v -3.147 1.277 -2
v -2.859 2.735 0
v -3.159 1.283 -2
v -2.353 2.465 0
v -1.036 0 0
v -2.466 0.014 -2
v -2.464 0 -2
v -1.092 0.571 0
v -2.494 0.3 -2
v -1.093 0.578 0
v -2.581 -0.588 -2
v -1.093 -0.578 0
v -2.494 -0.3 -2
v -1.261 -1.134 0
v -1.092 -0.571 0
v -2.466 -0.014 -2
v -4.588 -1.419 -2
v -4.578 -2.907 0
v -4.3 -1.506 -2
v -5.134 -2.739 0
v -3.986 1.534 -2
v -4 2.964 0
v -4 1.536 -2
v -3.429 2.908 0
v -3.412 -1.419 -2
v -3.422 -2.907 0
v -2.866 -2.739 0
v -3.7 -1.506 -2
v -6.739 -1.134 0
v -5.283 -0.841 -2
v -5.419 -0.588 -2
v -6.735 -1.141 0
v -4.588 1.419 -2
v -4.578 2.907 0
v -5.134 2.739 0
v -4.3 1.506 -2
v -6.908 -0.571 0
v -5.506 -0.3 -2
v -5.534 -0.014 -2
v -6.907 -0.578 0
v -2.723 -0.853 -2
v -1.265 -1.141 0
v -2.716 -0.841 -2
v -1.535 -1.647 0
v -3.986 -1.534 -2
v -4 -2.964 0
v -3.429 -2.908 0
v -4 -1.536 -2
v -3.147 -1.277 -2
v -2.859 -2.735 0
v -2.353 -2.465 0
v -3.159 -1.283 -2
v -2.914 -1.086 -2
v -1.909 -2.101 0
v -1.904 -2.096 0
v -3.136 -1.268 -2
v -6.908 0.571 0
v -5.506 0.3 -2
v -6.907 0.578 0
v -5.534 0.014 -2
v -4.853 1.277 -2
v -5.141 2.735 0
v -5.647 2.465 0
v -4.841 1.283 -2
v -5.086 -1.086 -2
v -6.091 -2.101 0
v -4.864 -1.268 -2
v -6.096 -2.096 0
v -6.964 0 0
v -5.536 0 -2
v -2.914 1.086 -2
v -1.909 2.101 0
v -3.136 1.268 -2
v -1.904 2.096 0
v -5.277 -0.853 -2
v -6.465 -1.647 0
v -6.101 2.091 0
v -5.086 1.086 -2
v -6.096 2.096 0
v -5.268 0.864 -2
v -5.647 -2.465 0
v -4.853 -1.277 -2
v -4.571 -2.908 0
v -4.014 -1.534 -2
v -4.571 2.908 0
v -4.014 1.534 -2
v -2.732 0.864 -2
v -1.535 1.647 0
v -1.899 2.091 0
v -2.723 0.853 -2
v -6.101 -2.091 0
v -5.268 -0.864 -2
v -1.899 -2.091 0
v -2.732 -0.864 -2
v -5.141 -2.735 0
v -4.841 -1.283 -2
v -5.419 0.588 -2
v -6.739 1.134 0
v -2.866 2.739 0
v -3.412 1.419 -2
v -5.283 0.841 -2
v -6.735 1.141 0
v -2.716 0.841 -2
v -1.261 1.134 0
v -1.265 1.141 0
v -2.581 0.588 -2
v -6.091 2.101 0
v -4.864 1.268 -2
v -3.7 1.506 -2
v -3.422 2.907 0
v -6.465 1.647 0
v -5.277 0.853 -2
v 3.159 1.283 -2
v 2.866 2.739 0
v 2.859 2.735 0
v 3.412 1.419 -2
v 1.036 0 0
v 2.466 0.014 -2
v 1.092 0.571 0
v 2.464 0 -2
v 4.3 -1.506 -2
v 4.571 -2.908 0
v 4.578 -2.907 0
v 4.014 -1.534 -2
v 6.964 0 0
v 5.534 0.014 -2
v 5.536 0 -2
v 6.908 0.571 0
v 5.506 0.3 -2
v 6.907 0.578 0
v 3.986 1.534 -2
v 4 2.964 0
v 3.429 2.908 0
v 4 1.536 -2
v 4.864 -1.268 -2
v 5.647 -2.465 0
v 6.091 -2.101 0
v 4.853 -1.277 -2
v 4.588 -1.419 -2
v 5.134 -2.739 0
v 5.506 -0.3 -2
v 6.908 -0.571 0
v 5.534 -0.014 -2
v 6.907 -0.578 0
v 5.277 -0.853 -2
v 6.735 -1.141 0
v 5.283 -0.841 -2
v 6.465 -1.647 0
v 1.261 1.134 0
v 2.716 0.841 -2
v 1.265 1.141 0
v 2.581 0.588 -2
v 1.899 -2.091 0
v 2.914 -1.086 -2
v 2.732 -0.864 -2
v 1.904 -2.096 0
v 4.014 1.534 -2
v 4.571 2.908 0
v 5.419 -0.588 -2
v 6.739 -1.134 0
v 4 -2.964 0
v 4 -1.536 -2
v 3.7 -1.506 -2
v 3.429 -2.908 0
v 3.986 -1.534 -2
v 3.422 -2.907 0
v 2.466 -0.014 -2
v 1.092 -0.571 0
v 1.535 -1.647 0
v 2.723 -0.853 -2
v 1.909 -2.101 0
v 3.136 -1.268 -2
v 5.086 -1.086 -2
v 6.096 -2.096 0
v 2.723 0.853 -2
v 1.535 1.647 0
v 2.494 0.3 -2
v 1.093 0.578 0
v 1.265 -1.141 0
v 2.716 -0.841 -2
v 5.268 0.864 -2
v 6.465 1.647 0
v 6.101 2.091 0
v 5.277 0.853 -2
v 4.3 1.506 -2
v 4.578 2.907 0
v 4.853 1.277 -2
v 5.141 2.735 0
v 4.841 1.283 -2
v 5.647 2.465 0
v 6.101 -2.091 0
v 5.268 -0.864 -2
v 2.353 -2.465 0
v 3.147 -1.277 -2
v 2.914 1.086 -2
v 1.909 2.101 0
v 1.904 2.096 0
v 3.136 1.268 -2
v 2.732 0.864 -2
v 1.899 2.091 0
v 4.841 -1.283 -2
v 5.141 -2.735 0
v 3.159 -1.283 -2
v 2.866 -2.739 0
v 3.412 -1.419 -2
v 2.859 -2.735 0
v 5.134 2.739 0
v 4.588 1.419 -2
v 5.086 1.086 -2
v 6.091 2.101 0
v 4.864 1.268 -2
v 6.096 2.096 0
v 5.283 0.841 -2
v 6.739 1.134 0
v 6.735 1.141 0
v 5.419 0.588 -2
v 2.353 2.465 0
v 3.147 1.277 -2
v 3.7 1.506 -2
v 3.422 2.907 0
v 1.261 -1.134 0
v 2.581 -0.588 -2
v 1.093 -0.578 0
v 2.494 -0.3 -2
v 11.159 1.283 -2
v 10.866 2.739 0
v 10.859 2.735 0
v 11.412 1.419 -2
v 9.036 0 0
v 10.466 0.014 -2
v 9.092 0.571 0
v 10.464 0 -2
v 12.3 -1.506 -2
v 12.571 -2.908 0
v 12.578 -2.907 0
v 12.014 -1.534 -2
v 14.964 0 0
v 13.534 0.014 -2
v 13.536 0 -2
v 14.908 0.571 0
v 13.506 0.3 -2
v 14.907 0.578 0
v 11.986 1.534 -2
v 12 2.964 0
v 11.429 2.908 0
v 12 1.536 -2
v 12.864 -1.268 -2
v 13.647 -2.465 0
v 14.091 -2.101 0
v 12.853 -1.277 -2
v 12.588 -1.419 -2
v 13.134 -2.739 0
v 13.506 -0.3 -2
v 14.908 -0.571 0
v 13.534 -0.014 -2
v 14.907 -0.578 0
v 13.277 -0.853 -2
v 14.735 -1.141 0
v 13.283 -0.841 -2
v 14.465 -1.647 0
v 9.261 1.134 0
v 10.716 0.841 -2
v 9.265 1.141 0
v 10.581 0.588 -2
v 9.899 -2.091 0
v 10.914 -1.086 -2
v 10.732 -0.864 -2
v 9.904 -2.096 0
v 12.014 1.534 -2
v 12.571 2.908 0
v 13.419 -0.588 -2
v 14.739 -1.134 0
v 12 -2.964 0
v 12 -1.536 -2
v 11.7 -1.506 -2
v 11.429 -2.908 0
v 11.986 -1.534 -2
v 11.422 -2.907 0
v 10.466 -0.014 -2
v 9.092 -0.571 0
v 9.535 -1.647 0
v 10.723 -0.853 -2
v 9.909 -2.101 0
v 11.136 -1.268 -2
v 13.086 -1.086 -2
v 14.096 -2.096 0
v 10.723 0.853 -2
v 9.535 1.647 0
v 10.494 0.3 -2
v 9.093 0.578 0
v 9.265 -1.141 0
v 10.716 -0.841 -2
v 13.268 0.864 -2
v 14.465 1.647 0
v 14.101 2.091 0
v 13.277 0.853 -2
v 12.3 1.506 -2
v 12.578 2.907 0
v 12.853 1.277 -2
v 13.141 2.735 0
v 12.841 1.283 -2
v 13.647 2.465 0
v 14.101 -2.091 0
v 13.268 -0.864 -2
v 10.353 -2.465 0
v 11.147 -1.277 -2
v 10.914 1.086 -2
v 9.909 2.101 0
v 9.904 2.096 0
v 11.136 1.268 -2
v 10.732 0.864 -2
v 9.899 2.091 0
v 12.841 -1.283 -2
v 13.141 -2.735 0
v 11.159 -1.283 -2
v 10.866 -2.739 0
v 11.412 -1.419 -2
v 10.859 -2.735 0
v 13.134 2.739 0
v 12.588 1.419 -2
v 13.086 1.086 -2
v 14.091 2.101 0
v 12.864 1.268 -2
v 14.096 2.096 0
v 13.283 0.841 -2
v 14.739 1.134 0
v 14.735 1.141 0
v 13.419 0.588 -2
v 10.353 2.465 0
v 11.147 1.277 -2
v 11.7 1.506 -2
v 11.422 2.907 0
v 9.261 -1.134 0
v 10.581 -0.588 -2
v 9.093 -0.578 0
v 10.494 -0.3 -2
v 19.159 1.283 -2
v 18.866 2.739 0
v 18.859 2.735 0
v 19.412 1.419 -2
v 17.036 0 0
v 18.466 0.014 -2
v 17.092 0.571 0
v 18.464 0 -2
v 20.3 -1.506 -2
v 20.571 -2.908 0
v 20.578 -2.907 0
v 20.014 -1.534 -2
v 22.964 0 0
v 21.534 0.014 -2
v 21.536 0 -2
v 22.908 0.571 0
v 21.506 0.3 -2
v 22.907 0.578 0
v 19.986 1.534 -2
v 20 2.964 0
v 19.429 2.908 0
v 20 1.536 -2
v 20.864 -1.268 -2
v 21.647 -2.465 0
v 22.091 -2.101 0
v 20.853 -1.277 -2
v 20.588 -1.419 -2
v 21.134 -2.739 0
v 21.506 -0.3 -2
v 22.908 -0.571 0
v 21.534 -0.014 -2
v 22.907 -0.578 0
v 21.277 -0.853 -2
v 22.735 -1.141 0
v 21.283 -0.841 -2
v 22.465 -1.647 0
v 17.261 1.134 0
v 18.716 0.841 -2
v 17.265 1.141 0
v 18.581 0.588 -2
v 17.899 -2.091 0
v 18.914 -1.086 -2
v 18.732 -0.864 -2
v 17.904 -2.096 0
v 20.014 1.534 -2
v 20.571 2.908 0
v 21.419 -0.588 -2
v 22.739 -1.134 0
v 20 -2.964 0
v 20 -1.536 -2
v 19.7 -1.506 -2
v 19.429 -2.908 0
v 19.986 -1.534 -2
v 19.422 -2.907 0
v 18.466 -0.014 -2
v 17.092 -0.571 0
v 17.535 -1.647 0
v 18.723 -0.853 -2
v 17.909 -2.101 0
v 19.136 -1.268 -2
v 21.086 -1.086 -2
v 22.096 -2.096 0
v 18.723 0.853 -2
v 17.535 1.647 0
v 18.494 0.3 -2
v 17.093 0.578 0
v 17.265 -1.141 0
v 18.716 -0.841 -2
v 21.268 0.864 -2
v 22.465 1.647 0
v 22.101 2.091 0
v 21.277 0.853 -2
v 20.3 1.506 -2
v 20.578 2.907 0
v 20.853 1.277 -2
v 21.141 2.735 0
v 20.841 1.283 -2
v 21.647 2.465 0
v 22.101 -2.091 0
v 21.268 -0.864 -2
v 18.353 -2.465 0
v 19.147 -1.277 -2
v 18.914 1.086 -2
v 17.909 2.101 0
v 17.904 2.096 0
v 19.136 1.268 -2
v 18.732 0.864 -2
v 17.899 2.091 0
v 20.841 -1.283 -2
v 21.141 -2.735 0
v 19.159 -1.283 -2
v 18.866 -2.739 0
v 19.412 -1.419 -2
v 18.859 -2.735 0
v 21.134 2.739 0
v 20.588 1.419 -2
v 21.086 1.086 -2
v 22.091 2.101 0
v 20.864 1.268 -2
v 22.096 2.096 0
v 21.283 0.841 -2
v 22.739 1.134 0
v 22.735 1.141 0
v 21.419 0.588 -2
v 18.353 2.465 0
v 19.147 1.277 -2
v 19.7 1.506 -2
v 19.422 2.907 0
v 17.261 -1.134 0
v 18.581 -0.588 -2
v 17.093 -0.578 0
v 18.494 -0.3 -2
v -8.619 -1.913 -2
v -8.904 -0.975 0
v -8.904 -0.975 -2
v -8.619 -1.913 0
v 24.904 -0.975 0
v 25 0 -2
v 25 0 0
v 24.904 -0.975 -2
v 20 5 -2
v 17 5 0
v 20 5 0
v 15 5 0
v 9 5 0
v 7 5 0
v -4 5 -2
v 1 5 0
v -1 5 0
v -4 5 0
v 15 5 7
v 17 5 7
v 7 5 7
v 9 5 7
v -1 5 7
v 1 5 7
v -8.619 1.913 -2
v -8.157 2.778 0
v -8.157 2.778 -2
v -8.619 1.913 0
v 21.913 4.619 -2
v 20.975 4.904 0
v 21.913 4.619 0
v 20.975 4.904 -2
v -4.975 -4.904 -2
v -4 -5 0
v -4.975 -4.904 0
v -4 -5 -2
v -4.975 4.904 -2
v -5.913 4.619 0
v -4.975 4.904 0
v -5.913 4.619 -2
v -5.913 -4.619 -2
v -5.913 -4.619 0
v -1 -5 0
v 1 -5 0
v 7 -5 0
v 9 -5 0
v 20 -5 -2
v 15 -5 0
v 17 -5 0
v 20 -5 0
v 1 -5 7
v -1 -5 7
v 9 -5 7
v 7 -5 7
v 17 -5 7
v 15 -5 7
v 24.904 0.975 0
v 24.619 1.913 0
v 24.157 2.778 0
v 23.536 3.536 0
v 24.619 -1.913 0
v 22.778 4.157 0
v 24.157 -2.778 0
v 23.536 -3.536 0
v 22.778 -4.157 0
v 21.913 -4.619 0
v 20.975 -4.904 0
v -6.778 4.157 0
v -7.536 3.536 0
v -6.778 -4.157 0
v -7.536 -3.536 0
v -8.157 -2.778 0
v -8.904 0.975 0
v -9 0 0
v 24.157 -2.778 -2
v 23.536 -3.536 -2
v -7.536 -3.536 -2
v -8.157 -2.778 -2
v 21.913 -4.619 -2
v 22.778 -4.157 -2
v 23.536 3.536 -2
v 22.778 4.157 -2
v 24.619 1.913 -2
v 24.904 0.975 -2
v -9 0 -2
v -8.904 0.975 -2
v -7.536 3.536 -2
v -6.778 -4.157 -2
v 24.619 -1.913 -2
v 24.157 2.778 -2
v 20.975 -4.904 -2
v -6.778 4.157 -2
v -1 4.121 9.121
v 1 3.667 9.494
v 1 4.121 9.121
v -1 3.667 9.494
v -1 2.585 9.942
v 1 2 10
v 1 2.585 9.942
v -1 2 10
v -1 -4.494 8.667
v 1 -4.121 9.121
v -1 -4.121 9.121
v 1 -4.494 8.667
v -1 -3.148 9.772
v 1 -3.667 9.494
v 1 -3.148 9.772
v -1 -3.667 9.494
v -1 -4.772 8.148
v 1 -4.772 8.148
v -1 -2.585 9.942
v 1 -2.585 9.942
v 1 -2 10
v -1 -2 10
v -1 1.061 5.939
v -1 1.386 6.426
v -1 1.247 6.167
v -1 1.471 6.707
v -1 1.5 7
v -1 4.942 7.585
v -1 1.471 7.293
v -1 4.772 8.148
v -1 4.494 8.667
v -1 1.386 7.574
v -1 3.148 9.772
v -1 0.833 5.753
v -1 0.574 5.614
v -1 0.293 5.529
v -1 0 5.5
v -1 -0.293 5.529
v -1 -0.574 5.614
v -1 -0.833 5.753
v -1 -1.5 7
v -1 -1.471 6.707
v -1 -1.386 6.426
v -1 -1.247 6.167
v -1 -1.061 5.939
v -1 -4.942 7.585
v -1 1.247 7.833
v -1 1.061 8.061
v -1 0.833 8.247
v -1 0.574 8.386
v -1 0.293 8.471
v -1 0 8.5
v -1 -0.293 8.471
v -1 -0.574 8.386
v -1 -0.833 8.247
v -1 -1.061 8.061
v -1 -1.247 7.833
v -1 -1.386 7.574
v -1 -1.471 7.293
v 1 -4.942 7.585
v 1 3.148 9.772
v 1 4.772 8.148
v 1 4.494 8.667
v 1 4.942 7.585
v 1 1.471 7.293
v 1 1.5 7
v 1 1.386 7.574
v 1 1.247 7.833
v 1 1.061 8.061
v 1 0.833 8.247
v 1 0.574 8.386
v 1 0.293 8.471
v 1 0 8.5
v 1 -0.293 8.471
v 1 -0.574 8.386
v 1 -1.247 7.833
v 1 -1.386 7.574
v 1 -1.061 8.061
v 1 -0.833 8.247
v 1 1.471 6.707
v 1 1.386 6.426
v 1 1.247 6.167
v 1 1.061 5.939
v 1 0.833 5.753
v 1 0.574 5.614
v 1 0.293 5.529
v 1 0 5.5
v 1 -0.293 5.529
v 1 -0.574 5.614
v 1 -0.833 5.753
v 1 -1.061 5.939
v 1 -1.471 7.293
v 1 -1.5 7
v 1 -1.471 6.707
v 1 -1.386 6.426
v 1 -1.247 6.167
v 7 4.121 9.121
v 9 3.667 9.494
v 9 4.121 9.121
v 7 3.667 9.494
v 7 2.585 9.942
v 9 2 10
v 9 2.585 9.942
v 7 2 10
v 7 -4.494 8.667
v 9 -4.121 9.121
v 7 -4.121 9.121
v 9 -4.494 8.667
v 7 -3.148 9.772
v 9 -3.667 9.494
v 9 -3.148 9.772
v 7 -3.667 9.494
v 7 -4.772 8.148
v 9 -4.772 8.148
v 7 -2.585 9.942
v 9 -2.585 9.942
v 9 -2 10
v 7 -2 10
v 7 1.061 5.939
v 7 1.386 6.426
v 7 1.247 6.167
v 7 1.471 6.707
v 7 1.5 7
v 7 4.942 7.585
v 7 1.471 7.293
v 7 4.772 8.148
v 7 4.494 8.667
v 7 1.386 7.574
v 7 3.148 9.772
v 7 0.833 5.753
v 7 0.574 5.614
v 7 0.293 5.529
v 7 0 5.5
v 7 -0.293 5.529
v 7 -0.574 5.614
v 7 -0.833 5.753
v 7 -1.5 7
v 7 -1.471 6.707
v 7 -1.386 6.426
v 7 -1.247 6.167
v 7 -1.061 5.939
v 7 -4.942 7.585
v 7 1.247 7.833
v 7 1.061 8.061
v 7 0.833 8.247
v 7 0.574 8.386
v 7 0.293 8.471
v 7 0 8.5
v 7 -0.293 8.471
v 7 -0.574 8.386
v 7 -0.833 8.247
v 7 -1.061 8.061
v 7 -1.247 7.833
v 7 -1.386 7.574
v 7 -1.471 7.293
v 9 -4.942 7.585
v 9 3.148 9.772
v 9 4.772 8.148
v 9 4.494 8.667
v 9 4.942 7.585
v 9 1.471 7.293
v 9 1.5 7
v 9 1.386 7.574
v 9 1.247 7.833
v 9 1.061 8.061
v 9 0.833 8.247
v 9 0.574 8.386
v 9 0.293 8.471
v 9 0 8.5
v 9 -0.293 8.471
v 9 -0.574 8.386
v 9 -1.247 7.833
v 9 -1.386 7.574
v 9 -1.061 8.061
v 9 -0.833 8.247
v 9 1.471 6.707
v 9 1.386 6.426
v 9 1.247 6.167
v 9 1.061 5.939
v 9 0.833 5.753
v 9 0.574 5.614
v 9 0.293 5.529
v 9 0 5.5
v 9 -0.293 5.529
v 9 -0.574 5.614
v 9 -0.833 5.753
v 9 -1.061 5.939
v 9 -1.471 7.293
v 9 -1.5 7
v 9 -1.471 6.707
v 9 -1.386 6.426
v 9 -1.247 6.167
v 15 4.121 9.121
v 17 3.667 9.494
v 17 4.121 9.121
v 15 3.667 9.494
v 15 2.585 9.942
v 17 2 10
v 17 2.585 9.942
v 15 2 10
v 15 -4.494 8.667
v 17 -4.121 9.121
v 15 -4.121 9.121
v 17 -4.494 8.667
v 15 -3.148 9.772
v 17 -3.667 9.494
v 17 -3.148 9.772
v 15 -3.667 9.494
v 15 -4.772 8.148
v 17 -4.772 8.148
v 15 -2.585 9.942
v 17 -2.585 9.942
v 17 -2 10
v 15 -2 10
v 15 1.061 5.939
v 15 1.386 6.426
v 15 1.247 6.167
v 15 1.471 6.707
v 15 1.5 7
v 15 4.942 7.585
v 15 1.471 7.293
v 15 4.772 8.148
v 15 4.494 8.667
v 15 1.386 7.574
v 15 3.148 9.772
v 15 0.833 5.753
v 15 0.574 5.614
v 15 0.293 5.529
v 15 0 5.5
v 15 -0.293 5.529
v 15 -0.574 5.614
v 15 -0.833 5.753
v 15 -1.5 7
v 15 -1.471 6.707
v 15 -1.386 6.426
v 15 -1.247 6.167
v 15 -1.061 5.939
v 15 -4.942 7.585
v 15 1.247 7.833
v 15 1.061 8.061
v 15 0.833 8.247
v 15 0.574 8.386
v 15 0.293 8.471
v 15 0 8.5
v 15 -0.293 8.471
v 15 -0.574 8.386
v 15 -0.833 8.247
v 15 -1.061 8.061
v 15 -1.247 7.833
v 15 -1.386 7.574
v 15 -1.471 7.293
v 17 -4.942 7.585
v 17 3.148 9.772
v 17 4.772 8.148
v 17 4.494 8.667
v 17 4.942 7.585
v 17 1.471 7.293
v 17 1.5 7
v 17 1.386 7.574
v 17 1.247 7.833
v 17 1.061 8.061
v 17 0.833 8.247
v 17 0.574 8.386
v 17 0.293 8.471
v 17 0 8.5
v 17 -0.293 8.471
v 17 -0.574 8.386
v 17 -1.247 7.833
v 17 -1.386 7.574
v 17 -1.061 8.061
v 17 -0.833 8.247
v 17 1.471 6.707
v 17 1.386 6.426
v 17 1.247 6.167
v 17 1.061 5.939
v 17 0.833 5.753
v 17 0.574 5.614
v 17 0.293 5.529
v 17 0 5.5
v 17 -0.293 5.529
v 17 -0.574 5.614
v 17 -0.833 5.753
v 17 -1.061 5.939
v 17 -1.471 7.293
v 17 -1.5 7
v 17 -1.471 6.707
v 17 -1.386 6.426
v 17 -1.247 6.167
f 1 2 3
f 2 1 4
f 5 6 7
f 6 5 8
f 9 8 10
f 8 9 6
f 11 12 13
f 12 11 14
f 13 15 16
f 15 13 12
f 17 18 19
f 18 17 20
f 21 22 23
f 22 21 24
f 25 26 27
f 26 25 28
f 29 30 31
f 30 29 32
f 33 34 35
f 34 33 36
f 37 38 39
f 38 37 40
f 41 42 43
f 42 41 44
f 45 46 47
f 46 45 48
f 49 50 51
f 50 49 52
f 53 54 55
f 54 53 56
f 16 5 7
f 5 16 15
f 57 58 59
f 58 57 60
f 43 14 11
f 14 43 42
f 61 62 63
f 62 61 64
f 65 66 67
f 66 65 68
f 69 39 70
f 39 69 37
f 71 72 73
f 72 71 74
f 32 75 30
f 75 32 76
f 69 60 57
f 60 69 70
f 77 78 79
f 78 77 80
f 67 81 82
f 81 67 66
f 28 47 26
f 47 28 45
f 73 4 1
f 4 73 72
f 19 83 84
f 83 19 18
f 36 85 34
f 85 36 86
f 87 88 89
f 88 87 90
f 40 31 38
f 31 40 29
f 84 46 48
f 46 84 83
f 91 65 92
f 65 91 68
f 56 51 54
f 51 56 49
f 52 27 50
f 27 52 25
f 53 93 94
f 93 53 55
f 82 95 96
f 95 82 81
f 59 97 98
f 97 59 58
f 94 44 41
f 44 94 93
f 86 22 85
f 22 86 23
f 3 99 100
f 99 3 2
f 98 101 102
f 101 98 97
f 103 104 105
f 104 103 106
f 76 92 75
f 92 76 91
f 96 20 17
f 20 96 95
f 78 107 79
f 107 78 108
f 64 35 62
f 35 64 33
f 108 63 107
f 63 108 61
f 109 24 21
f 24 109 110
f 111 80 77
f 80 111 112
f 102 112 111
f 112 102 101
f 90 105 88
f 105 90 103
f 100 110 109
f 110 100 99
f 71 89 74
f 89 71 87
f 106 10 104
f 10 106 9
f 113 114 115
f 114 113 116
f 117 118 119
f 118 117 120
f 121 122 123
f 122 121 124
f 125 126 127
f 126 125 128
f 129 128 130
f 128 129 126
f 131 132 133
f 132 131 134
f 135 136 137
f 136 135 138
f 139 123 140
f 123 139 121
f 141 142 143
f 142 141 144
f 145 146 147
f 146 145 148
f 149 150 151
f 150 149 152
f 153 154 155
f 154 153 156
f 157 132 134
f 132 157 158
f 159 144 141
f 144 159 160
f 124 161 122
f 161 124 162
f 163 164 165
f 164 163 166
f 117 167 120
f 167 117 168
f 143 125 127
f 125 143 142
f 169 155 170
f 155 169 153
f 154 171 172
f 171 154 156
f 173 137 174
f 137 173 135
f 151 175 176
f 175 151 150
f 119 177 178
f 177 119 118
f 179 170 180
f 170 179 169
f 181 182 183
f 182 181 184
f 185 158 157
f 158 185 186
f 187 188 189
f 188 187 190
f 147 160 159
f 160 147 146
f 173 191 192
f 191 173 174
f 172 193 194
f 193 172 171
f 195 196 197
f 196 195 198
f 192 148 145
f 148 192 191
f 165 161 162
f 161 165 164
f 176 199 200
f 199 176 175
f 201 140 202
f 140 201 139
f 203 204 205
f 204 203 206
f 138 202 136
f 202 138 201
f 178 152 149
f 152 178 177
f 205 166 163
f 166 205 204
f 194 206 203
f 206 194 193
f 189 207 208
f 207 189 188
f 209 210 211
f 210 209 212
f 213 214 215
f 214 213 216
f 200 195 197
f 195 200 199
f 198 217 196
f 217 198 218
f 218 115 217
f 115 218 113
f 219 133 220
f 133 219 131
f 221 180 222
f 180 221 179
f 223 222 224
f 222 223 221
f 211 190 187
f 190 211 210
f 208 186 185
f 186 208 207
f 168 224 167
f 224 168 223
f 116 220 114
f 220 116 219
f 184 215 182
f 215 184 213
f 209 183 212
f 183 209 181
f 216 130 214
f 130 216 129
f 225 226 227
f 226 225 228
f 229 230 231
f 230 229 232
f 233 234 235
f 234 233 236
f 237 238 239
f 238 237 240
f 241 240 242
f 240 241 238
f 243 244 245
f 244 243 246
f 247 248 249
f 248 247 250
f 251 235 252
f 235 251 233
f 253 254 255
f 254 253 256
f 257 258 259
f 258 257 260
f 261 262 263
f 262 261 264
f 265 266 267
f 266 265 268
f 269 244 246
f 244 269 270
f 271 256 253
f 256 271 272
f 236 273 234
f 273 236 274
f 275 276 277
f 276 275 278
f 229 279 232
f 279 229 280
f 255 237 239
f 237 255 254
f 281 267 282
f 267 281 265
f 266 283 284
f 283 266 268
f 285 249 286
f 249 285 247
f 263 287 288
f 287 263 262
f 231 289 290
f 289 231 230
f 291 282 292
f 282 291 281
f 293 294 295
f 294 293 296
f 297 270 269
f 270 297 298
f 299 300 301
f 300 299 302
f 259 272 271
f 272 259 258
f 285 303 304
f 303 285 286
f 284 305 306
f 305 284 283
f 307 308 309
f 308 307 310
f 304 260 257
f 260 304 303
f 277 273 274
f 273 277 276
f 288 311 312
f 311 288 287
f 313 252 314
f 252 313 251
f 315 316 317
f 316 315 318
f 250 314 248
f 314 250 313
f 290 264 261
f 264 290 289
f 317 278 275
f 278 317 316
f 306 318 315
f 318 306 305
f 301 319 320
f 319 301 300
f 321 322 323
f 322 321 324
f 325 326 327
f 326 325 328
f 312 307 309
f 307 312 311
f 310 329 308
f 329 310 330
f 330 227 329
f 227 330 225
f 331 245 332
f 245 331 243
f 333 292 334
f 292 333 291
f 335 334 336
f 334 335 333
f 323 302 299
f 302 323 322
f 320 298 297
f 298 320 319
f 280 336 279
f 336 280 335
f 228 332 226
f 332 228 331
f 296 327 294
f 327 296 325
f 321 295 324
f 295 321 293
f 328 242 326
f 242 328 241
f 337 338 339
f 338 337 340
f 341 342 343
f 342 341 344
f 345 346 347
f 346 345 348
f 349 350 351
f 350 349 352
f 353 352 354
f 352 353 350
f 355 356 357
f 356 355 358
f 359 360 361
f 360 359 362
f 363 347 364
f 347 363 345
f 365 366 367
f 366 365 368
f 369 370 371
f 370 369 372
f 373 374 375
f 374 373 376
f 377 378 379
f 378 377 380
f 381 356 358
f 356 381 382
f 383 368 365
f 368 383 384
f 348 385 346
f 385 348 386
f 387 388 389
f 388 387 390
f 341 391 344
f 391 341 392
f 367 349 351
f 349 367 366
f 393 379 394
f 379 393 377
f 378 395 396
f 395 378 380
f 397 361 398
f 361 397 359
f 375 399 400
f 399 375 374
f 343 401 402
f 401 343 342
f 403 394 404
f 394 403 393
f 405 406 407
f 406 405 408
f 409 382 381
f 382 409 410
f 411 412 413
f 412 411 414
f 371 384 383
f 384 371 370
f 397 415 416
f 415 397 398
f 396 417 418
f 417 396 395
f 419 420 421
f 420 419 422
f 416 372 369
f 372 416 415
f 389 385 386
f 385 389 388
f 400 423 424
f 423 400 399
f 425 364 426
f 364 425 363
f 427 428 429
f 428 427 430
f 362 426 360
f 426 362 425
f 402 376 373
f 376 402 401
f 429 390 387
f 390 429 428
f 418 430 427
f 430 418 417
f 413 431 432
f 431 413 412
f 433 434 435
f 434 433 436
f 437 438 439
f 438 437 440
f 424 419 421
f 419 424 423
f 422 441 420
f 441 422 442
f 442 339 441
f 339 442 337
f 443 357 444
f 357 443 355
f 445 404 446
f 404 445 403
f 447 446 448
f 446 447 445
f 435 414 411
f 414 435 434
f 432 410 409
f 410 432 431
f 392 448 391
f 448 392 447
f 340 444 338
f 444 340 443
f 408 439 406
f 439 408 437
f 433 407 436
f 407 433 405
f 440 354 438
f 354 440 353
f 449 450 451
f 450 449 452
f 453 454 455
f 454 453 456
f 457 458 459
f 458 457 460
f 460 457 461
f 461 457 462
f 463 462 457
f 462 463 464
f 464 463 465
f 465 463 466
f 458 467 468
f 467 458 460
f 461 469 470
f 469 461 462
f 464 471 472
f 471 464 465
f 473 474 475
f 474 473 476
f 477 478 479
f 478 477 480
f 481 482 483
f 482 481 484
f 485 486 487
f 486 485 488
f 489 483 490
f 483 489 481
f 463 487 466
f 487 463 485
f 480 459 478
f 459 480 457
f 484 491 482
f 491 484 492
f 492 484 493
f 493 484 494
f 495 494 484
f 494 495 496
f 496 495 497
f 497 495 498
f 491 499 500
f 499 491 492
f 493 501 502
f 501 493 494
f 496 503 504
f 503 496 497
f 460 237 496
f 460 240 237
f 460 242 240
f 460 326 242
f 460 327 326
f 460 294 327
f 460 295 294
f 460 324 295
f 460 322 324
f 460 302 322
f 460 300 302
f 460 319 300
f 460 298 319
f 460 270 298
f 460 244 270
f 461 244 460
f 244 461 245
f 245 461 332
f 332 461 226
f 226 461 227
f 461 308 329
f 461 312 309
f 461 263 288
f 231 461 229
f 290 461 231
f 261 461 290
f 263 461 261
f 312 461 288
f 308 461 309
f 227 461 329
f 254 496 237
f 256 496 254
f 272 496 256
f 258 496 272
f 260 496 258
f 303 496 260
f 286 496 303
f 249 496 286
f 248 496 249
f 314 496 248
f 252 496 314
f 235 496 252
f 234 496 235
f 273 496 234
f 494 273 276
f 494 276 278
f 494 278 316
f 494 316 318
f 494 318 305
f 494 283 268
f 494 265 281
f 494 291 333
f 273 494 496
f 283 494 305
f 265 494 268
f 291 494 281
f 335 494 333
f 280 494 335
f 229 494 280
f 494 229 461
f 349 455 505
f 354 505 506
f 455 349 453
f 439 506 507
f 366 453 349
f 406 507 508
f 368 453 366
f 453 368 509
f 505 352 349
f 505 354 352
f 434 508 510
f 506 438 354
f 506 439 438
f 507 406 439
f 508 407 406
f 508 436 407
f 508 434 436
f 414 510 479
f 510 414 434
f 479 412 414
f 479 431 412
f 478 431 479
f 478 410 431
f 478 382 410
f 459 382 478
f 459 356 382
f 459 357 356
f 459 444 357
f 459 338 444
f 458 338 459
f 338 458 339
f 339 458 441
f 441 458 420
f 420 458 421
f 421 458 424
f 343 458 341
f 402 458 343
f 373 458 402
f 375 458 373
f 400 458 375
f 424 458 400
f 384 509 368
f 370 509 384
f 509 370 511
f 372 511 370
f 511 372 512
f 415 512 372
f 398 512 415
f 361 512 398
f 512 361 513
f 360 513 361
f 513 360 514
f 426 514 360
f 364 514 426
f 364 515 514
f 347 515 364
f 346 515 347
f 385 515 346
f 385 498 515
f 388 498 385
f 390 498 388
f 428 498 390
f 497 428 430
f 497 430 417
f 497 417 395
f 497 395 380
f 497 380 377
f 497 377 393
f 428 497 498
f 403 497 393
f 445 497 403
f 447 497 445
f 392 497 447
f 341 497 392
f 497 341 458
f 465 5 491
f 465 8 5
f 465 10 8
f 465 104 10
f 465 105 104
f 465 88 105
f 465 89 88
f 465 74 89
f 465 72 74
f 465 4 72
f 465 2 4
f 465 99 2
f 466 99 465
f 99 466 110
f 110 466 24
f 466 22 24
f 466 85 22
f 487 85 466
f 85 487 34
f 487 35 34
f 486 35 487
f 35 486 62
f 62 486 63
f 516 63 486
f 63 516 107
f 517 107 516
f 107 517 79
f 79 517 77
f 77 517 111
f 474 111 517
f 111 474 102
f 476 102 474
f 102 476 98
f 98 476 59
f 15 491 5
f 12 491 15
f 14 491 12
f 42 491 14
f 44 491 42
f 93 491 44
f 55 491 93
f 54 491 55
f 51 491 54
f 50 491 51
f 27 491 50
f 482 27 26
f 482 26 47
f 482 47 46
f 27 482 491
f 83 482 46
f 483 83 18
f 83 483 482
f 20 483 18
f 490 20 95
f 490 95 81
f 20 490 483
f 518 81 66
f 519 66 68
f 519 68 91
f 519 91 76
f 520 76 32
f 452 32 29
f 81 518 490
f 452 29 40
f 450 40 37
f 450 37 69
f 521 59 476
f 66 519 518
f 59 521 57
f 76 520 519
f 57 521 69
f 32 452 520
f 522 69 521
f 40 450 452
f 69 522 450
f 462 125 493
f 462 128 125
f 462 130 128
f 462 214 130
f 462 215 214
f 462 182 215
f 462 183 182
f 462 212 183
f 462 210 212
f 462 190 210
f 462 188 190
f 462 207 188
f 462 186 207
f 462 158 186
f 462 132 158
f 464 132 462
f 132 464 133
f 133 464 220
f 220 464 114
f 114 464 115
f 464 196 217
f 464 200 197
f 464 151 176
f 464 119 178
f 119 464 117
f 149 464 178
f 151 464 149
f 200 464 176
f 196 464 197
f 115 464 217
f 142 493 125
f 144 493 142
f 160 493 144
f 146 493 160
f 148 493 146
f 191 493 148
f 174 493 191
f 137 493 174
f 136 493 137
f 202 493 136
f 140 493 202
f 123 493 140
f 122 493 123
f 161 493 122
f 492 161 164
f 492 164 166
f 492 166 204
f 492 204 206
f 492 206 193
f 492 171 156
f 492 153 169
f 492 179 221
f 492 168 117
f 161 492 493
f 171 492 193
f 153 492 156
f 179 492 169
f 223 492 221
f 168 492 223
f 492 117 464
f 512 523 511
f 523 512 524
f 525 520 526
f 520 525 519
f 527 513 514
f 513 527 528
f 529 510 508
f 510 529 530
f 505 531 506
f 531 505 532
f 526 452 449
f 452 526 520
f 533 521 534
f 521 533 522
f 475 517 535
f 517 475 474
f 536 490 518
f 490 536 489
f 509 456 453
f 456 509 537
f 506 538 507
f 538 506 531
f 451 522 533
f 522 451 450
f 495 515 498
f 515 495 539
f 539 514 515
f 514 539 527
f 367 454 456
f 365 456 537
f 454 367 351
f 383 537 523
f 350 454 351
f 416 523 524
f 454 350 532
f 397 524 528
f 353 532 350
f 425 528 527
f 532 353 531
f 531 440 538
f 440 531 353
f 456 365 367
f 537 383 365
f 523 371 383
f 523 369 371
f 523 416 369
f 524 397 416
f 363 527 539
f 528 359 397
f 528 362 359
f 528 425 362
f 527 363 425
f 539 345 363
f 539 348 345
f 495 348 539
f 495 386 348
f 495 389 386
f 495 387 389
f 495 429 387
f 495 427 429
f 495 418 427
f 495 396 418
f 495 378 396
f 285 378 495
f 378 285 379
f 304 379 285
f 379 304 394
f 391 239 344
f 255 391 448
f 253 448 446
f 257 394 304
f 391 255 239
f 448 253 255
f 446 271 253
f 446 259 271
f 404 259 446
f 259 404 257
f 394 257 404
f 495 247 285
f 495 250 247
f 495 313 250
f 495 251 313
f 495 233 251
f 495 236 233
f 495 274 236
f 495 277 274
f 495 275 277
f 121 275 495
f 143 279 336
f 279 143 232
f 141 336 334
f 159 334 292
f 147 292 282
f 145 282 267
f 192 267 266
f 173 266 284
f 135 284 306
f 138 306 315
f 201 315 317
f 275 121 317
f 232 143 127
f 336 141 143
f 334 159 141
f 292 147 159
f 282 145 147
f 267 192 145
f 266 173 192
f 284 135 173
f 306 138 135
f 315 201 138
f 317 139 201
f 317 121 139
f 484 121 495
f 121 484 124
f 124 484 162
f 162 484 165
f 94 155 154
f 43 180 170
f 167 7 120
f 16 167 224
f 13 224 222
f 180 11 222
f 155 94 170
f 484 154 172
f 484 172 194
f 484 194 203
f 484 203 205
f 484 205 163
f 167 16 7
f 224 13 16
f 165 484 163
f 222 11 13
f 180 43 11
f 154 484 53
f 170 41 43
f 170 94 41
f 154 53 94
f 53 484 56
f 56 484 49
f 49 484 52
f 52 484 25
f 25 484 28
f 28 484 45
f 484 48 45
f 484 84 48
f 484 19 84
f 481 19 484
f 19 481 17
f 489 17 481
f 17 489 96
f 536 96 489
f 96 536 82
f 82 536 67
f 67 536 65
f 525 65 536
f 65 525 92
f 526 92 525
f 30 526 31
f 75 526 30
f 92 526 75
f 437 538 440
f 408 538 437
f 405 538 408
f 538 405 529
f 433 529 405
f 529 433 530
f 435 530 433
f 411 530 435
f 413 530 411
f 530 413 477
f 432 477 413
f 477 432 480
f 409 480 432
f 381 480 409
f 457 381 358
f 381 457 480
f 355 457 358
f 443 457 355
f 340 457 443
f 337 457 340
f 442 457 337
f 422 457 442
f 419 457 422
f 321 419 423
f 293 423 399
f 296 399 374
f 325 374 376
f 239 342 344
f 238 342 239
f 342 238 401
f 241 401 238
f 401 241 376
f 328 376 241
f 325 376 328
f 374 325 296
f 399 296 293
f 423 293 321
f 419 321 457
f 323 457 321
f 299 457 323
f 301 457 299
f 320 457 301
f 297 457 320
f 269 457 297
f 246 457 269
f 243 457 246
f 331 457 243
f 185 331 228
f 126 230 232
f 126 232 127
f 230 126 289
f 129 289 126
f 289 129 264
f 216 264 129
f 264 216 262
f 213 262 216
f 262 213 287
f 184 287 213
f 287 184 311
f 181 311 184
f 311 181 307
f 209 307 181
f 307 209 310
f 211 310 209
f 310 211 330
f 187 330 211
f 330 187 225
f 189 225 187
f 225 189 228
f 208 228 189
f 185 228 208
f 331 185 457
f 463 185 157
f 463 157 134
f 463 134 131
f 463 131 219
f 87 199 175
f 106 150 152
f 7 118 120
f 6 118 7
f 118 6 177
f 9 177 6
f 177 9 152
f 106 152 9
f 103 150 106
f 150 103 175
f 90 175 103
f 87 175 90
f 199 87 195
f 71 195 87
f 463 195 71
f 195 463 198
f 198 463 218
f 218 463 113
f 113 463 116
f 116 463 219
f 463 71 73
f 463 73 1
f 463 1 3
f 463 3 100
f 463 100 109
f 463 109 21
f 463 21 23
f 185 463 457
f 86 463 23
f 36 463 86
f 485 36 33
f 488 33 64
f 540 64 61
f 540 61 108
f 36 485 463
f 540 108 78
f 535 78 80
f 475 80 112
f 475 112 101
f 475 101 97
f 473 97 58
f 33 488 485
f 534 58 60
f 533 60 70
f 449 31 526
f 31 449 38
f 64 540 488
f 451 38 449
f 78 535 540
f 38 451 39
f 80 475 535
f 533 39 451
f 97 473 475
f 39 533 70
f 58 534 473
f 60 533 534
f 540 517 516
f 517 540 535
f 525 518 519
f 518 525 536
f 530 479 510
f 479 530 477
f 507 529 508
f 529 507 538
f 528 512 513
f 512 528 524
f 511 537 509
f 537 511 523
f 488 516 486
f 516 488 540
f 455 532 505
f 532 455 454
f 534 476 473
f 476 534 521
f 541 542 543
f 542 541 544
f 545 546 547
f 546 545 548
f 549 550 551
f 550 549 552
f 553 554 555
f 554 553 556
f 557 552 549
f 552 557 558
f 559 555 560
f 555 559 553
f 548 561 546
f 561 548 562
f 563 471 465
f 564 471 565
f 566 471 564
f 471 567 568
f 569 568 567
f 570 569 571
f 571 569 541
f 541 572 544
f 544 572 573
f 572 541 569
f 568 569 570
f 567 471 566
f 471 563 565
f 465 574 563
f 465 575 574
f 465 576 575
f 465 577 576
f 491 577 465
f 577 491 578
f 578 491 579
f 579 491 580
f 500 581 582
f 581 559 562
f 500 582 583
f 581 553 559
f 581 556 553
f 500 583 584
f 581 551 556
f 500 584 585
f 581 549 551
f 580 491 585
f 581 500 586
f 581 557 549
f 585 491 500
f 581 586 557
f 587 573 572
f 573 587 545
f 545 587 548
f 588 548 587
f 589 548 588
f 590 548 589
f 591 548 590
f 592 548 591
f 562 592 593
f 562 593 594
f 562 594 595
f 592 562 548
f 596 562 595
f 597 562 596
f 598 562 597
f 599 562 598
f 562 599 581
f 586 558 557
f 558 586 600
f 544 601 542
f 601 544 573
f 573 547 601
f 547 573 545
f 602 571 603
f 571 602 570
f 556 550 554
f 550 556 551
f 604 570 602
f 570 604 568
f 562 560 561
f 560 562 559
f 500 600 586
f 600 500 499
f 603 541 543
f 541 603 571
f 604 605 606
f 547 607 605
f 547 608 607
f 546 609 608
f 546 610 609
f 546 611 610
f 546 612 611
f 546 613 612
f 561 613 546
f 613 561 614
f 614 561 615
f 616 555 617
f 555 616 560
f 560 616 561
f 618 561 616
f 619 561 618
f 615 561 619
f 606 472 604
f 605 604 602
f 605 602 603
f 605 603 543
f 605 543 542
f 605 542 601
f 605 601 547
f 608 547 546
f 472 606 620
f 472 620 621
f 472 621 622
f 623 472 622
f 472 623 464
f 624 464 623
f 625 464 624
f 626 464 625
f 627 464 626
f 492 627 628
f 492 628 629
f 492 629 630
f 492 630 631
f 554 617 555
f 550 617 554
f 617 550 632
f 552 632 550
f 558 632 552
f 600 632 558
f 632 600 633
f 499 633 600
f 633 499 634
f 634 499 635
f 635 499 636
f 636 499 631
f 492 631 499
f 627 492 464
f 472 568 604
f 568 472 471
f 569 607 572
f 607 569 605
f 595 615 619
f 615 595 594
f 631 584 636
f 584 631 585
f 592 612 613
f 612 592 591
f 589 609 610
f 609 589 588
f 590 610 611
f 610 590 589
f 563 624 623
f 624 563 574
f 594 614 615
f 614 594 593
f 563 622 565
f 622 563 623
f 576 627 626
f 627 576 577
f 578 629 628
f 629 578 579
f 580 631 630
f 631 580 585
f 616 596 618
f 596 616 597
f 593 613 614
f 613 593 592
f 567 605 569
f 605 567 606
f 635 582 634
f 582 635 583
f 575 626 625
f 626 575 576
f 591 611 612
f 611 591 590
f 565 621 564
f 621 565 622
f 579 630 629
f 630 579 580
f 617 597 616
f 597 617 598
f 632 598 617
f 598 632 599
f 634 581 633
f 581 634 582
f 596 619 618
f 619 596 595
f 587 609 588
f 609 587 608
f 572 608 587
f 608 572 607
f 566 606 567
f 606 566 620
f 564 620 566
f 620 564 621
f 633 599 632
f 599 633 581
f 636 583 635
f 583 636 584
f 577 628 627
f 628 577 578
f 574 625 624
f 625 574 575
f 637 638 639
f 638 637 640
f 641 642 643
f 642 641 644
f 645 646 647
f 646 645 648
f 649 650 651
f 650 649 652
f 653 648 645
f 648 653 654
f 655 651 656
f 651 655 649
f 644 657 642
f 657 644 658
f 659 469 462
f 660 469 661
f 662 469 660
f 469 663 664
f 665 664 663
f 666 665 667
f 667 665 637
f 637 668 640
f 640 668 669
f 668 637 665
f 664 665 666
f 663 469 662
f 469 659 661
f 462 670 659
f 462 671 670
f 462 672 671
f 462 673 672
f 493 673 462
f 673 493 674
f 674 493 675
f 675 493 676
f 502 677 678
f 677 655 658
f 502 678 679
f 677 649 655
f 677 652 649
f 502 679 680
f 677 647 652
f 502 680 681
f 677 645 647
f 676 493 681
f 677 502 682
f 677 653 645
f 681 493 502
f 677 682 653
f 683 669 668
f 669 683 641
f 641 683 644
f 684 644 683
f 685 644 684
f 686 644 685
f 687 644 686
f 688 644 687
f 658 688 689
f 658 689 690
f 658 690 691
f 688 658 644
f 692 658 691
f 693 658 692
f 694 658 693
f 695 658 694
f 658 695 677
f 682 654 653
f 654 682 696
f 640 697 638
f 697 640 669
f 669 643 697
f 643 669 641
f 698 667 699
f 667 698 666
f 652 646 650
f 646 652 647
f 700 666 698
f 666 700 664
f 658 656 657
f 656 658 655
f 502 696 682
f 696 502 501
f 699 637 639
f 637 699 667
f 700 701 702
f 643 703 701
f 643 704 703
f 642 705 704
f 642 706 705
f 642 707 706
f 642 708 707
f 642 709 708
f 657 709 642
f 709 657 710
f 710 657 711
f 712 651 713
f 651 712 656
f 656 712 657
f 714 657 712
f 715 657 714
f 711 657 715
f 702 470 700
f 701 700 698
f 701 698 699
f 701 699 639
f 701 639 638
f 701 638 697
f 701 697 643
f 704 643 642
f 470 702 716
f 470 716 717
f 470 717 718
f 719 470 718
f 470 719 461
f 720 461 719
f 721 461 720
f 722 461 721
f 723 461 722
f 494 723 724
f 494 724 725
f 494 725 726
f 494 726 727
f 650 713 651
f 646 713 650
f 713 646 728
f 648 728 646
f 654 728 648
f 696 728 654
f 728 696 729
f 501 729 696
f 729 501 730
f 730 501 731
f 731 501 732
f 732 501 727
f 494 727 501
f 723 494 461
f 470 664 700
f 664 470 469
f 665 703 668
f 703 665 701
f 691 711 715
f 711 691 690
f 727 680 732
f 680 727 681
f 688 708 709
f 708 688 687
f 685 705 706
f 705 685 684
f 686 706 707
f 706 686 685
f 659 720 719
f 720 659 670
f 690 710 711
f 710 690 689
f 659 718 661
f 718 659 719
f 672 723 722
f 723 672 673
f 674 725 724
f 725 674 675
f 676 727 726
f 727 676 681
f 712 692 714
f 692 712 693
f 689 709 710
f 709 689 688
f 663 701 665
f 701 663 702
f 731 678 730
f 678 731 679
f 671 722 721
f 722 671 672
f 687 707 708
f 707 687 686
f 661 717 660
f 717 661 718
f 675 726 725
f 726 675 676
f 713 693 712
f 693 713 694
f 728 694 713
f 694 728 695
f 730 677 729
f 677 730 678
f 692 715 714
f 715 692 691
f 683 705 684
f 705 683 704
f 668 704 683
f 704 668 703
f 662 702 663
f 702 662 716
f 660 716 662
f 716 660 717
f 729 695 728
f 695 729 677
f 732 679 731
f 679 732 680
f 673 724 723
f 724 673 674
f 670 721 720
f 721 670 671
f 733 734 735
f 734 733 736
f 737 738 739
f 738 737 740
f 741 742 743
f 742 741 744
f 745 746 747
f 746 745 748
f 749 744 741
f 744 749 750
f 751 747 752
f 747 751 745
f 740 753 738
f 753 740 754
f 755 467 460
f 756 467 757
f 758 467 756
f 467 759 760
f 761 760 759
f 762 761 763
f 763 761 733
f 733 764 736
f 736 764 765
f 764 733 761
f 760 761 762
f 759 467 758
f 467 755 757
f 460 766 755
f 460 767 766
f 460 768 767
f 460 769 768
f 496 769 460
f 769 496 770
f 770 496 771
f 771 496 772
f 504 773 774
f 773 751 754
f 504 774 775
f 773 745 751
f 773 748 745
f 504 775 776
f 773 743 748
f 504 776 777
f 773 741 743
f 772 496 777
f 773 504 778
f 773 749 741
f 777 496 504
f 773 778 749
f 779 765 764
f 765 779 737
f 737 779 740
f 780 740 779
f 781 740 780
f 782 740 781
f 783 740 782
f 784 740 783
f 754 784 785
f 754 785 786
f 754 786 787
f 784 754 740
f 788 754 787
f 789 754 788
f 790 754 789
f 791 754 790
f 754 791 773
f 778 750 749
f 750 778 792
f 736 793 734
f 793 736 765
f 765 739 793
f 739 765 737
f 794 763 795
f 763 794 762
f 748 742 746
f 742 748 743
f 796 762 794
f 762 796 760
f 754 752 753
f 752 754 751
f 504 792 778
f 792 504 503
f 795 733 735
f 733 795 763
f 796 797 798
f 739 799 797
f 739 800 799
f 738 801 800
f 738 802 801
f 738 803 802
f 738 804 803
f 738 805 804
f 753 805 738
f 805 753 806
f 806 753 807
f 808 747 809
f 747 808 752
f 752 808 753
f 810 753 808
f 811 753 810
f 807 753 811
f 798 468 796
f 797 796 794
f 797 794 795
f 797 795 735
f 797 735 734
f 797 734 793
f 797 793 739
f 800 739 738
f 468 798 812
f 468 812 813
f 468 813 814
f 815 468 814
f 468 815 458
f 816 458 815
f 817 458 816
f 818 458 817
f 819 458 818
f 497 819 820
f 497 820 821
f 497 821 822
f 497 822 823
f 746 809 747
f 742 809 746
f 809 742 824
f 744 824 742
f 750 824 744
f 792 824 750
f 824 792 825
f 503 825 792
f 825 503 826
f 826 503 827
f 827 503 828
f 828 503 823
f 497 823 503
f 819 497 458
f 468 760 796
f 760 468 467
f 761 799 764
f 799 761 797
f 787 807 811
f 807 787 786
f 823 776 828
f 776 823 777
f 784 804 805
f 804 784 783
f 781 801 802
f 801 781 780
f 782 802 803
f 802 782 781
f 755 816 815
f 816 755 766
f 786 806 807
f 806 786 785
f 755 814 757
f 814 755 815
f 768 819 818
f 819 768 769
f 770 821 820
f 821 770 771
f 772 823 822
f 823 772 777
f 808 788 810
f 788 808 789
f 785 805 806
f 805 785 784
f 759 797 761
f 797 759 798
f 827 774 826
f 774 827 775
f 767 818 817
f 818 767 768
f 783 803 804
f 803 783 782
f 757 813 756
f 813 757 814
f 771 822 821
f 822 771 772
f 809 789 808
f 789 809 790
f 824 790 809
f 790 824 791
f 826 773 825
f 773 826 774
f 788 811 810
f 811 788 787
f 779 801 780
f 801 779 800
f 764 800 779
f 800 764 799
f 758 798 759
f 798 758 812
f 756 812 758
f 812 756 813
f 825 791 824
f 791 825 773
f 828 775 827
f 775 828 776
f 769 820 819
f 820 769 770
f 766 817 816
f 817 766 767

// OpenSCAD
$fn=32*1;

// Number of spots for cables
num_slots = 2; // [1:20]

// Gap for each cable (mm)
slot_width = 6;

// Thickness of walls separating cables (mm)
wall_thickness = 2;

// How far out the walls stick out from the base (mm)
wall_depth = 10;

// Height of the assembly (mm)
height = 10;

// Thickness of the back plate (mm)
back_thickness = 2;

// Diameter of the mounting holes in the back plate (mm). A value of 3mm is appropriate for #4 wood screws.
back_hole_dia = 3;

// Diameter of the holes in the walls for ziptie, bolt+nut, etc. (mm)
slot_hole_dia = 3;

// Radius of the rounding of the walls (mm)
wall_corner_radius=3;

// Countersink the holes for wood screws to sit flush?
back_wood_screws = 1; // [1:Yes, 0:No]

// For wood screws, how many times bigger is the head than the shaft?
wood_screw_head_ratio = 2;

difference() {
    translate([0,0,-back_thickness]) hull() {
        x0 = -wall_thickness/2-slot_width/2;
        x1 = num_slots*(slot_width+wall_thickness)+wall_thickness/2+slot_width/2;
        translate([x0,0]) cylinder(d=height, h=back_thickness);
        translate([x1,0]) cylinder(d=height, h=back_thickness);
    }
    for (s = [-1:num_slots-1+1]) {
        x = (slot_width+wall_thickness)*s+wall_thickness/2+slot_width/2;
        if (back_wood_screws) {
            translate([x,0,-back_thickness/2]) cylinder(d1=back_hole_dia, d2=back_hole_dia*wood_screw_head_ratio ,h=back_thickness+0.1,center=true);
        } else {
            translate([x,0,0]) cylinder(d=back_hole_dia ,h=20,center=true);
        }
            
    }
}

for (s = [0:num_slots]) {
    x = (slot_width+wall_thickness)*s;
    translate([x,0,0]) difference() {
        hull() {
            translate([-wall_thickness/2,-height/2]) cube([wall_thickness,height,0.1]);
            y = height/2-wall_corner_radius;
            z = wall_depth-wall_corner_radius;
            for (m = [0,1]) mirror([0,m]) 
                translate([0,y,z]) rotate([0,90]) cylinder(r=wall_corner_radius,h=wall_thickness,center=true);
        }
        translate([0,0,wall_depth-slot_hole_dia]) rotate([0,-90]) cylinder(d=slot_hole_dia,h=20,center=true);
    }
}


